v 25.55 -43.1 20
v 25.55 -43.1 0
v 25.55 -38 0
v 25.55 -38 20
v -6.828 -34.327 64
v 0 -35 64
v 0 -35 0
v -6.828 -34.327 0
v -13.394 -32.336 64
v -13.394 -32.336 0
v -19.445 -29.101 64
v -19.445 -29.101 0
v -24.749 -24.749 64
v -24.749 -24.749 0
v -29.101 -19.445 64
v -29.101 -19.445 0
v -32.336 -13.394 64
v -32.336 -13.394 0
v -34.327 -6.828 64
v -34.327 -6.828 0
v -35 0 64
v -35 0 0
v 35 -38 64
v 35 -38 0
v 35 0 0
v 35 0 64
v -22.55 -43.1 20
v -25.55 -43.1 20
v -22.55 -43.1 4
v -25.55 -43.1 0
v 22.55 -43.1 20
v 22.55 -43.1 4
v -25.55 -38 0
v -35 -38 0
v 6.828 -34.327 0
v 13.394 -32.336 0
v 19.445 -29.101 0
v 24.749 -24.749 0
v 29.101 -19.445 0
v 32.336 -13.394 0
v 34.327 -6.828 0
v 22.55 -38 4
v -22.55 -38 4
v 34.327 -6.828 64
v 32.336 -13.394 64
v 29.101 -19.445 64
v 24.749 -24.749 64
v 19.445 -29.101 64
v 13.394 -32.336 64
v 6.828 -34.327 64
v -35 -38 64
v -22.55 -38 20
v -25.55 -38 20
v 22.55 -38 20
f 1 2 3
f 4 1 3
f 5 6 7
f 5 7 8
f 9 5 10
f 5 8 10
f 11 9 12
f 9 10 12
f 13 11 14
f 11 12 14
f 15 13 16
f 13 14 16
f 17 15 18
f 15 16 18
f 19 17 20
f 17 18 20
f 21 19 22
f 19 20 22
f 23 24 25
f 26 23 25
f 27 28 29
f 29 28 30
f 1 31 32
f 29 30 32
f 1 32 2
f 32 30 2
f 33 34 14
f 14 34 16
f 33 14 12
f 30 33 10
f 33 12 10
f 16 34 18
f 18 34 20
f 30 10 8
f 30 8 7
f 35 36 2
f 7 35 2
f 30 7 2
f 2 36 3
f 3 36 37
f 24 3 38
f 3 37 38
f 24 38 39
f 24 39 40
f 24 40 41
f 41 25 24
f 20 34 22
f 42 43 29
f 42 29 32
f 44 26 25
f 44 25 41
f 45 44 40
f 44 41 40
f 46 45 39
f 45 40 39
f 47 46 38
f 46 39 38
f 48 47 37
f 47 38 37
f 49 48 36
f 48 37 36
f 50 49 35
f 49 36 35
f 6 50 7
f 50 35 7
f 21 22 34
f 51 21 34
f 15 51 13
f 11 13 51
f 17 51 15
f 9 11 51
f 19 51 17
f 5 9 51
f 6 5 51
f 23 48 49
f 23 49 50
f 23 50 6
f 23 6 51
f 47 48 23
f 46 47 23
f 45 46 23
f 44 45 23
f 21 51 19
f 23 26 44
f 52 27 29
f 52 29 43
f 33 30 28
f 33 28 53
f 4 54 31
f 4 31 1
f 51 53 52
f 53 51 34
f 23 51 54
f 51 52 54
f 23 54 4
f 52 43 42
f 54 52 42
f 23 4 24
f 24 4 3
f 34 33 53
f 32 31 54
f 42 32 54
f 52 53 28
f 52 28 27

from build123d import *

# Parameters (mm, degrees)
F1_DEPTH = 64
F2_DEPTH = 4
F0_W     = 3
F0_H     = 5.1
F3_DEPTH = 20


with BuildPart() as f1:
    # F0 (on Top) → F1 (new body)
    with BuildSketch(Plane.XY):
        with BuildLine():
            ThreePointArc((0, -35), (-24.748737, -24.748737), (-35, 0))
            Line((-35, 0), (-35, -38))
            Line((-35, -38), (-25.55, -38))
            Line((-25.55, -38), (-22.55, -38))
            Line((-22.55, -38), (0, -38))
            Line((0, -38), (0, -35))
        make_face()
        with BuildLine():
            Line((35, -38), (35, 0))
            ThreePointArc((35, 0), (24.748737, -24.748737), (0, -35))
            Line((0, -35), (0, -38))
            Line((0, -38), (22.55, -38))
            Line((22.55, -38), (25.55, -38))
            Line((25.55, -38), (35, -38))
        make_face()
    extrude(amount=F1_DEPTH)

    # F0 (on Top) → F2 (join)
    with BuildSketch(Plane.XY):
        Polygon((22.55, -38), (0, -38), (-22.55, -38), (-22.55, -43.1), (22.55, -43.1), align=None)
    extrude(amount=F2_DEPTH)

    # F0 (on Top) → F3 (join)
    with BuildSketch(Plane.XY):
        with Locations((-24.05, -40.55)):
            Rectangle(F0_W, F0_H)
        with Locations((24.05, -40.55)):
            Rectangle(F0_W, F0_H)
    extrude(amount=F3_DEPTH)


solid = f1.part
